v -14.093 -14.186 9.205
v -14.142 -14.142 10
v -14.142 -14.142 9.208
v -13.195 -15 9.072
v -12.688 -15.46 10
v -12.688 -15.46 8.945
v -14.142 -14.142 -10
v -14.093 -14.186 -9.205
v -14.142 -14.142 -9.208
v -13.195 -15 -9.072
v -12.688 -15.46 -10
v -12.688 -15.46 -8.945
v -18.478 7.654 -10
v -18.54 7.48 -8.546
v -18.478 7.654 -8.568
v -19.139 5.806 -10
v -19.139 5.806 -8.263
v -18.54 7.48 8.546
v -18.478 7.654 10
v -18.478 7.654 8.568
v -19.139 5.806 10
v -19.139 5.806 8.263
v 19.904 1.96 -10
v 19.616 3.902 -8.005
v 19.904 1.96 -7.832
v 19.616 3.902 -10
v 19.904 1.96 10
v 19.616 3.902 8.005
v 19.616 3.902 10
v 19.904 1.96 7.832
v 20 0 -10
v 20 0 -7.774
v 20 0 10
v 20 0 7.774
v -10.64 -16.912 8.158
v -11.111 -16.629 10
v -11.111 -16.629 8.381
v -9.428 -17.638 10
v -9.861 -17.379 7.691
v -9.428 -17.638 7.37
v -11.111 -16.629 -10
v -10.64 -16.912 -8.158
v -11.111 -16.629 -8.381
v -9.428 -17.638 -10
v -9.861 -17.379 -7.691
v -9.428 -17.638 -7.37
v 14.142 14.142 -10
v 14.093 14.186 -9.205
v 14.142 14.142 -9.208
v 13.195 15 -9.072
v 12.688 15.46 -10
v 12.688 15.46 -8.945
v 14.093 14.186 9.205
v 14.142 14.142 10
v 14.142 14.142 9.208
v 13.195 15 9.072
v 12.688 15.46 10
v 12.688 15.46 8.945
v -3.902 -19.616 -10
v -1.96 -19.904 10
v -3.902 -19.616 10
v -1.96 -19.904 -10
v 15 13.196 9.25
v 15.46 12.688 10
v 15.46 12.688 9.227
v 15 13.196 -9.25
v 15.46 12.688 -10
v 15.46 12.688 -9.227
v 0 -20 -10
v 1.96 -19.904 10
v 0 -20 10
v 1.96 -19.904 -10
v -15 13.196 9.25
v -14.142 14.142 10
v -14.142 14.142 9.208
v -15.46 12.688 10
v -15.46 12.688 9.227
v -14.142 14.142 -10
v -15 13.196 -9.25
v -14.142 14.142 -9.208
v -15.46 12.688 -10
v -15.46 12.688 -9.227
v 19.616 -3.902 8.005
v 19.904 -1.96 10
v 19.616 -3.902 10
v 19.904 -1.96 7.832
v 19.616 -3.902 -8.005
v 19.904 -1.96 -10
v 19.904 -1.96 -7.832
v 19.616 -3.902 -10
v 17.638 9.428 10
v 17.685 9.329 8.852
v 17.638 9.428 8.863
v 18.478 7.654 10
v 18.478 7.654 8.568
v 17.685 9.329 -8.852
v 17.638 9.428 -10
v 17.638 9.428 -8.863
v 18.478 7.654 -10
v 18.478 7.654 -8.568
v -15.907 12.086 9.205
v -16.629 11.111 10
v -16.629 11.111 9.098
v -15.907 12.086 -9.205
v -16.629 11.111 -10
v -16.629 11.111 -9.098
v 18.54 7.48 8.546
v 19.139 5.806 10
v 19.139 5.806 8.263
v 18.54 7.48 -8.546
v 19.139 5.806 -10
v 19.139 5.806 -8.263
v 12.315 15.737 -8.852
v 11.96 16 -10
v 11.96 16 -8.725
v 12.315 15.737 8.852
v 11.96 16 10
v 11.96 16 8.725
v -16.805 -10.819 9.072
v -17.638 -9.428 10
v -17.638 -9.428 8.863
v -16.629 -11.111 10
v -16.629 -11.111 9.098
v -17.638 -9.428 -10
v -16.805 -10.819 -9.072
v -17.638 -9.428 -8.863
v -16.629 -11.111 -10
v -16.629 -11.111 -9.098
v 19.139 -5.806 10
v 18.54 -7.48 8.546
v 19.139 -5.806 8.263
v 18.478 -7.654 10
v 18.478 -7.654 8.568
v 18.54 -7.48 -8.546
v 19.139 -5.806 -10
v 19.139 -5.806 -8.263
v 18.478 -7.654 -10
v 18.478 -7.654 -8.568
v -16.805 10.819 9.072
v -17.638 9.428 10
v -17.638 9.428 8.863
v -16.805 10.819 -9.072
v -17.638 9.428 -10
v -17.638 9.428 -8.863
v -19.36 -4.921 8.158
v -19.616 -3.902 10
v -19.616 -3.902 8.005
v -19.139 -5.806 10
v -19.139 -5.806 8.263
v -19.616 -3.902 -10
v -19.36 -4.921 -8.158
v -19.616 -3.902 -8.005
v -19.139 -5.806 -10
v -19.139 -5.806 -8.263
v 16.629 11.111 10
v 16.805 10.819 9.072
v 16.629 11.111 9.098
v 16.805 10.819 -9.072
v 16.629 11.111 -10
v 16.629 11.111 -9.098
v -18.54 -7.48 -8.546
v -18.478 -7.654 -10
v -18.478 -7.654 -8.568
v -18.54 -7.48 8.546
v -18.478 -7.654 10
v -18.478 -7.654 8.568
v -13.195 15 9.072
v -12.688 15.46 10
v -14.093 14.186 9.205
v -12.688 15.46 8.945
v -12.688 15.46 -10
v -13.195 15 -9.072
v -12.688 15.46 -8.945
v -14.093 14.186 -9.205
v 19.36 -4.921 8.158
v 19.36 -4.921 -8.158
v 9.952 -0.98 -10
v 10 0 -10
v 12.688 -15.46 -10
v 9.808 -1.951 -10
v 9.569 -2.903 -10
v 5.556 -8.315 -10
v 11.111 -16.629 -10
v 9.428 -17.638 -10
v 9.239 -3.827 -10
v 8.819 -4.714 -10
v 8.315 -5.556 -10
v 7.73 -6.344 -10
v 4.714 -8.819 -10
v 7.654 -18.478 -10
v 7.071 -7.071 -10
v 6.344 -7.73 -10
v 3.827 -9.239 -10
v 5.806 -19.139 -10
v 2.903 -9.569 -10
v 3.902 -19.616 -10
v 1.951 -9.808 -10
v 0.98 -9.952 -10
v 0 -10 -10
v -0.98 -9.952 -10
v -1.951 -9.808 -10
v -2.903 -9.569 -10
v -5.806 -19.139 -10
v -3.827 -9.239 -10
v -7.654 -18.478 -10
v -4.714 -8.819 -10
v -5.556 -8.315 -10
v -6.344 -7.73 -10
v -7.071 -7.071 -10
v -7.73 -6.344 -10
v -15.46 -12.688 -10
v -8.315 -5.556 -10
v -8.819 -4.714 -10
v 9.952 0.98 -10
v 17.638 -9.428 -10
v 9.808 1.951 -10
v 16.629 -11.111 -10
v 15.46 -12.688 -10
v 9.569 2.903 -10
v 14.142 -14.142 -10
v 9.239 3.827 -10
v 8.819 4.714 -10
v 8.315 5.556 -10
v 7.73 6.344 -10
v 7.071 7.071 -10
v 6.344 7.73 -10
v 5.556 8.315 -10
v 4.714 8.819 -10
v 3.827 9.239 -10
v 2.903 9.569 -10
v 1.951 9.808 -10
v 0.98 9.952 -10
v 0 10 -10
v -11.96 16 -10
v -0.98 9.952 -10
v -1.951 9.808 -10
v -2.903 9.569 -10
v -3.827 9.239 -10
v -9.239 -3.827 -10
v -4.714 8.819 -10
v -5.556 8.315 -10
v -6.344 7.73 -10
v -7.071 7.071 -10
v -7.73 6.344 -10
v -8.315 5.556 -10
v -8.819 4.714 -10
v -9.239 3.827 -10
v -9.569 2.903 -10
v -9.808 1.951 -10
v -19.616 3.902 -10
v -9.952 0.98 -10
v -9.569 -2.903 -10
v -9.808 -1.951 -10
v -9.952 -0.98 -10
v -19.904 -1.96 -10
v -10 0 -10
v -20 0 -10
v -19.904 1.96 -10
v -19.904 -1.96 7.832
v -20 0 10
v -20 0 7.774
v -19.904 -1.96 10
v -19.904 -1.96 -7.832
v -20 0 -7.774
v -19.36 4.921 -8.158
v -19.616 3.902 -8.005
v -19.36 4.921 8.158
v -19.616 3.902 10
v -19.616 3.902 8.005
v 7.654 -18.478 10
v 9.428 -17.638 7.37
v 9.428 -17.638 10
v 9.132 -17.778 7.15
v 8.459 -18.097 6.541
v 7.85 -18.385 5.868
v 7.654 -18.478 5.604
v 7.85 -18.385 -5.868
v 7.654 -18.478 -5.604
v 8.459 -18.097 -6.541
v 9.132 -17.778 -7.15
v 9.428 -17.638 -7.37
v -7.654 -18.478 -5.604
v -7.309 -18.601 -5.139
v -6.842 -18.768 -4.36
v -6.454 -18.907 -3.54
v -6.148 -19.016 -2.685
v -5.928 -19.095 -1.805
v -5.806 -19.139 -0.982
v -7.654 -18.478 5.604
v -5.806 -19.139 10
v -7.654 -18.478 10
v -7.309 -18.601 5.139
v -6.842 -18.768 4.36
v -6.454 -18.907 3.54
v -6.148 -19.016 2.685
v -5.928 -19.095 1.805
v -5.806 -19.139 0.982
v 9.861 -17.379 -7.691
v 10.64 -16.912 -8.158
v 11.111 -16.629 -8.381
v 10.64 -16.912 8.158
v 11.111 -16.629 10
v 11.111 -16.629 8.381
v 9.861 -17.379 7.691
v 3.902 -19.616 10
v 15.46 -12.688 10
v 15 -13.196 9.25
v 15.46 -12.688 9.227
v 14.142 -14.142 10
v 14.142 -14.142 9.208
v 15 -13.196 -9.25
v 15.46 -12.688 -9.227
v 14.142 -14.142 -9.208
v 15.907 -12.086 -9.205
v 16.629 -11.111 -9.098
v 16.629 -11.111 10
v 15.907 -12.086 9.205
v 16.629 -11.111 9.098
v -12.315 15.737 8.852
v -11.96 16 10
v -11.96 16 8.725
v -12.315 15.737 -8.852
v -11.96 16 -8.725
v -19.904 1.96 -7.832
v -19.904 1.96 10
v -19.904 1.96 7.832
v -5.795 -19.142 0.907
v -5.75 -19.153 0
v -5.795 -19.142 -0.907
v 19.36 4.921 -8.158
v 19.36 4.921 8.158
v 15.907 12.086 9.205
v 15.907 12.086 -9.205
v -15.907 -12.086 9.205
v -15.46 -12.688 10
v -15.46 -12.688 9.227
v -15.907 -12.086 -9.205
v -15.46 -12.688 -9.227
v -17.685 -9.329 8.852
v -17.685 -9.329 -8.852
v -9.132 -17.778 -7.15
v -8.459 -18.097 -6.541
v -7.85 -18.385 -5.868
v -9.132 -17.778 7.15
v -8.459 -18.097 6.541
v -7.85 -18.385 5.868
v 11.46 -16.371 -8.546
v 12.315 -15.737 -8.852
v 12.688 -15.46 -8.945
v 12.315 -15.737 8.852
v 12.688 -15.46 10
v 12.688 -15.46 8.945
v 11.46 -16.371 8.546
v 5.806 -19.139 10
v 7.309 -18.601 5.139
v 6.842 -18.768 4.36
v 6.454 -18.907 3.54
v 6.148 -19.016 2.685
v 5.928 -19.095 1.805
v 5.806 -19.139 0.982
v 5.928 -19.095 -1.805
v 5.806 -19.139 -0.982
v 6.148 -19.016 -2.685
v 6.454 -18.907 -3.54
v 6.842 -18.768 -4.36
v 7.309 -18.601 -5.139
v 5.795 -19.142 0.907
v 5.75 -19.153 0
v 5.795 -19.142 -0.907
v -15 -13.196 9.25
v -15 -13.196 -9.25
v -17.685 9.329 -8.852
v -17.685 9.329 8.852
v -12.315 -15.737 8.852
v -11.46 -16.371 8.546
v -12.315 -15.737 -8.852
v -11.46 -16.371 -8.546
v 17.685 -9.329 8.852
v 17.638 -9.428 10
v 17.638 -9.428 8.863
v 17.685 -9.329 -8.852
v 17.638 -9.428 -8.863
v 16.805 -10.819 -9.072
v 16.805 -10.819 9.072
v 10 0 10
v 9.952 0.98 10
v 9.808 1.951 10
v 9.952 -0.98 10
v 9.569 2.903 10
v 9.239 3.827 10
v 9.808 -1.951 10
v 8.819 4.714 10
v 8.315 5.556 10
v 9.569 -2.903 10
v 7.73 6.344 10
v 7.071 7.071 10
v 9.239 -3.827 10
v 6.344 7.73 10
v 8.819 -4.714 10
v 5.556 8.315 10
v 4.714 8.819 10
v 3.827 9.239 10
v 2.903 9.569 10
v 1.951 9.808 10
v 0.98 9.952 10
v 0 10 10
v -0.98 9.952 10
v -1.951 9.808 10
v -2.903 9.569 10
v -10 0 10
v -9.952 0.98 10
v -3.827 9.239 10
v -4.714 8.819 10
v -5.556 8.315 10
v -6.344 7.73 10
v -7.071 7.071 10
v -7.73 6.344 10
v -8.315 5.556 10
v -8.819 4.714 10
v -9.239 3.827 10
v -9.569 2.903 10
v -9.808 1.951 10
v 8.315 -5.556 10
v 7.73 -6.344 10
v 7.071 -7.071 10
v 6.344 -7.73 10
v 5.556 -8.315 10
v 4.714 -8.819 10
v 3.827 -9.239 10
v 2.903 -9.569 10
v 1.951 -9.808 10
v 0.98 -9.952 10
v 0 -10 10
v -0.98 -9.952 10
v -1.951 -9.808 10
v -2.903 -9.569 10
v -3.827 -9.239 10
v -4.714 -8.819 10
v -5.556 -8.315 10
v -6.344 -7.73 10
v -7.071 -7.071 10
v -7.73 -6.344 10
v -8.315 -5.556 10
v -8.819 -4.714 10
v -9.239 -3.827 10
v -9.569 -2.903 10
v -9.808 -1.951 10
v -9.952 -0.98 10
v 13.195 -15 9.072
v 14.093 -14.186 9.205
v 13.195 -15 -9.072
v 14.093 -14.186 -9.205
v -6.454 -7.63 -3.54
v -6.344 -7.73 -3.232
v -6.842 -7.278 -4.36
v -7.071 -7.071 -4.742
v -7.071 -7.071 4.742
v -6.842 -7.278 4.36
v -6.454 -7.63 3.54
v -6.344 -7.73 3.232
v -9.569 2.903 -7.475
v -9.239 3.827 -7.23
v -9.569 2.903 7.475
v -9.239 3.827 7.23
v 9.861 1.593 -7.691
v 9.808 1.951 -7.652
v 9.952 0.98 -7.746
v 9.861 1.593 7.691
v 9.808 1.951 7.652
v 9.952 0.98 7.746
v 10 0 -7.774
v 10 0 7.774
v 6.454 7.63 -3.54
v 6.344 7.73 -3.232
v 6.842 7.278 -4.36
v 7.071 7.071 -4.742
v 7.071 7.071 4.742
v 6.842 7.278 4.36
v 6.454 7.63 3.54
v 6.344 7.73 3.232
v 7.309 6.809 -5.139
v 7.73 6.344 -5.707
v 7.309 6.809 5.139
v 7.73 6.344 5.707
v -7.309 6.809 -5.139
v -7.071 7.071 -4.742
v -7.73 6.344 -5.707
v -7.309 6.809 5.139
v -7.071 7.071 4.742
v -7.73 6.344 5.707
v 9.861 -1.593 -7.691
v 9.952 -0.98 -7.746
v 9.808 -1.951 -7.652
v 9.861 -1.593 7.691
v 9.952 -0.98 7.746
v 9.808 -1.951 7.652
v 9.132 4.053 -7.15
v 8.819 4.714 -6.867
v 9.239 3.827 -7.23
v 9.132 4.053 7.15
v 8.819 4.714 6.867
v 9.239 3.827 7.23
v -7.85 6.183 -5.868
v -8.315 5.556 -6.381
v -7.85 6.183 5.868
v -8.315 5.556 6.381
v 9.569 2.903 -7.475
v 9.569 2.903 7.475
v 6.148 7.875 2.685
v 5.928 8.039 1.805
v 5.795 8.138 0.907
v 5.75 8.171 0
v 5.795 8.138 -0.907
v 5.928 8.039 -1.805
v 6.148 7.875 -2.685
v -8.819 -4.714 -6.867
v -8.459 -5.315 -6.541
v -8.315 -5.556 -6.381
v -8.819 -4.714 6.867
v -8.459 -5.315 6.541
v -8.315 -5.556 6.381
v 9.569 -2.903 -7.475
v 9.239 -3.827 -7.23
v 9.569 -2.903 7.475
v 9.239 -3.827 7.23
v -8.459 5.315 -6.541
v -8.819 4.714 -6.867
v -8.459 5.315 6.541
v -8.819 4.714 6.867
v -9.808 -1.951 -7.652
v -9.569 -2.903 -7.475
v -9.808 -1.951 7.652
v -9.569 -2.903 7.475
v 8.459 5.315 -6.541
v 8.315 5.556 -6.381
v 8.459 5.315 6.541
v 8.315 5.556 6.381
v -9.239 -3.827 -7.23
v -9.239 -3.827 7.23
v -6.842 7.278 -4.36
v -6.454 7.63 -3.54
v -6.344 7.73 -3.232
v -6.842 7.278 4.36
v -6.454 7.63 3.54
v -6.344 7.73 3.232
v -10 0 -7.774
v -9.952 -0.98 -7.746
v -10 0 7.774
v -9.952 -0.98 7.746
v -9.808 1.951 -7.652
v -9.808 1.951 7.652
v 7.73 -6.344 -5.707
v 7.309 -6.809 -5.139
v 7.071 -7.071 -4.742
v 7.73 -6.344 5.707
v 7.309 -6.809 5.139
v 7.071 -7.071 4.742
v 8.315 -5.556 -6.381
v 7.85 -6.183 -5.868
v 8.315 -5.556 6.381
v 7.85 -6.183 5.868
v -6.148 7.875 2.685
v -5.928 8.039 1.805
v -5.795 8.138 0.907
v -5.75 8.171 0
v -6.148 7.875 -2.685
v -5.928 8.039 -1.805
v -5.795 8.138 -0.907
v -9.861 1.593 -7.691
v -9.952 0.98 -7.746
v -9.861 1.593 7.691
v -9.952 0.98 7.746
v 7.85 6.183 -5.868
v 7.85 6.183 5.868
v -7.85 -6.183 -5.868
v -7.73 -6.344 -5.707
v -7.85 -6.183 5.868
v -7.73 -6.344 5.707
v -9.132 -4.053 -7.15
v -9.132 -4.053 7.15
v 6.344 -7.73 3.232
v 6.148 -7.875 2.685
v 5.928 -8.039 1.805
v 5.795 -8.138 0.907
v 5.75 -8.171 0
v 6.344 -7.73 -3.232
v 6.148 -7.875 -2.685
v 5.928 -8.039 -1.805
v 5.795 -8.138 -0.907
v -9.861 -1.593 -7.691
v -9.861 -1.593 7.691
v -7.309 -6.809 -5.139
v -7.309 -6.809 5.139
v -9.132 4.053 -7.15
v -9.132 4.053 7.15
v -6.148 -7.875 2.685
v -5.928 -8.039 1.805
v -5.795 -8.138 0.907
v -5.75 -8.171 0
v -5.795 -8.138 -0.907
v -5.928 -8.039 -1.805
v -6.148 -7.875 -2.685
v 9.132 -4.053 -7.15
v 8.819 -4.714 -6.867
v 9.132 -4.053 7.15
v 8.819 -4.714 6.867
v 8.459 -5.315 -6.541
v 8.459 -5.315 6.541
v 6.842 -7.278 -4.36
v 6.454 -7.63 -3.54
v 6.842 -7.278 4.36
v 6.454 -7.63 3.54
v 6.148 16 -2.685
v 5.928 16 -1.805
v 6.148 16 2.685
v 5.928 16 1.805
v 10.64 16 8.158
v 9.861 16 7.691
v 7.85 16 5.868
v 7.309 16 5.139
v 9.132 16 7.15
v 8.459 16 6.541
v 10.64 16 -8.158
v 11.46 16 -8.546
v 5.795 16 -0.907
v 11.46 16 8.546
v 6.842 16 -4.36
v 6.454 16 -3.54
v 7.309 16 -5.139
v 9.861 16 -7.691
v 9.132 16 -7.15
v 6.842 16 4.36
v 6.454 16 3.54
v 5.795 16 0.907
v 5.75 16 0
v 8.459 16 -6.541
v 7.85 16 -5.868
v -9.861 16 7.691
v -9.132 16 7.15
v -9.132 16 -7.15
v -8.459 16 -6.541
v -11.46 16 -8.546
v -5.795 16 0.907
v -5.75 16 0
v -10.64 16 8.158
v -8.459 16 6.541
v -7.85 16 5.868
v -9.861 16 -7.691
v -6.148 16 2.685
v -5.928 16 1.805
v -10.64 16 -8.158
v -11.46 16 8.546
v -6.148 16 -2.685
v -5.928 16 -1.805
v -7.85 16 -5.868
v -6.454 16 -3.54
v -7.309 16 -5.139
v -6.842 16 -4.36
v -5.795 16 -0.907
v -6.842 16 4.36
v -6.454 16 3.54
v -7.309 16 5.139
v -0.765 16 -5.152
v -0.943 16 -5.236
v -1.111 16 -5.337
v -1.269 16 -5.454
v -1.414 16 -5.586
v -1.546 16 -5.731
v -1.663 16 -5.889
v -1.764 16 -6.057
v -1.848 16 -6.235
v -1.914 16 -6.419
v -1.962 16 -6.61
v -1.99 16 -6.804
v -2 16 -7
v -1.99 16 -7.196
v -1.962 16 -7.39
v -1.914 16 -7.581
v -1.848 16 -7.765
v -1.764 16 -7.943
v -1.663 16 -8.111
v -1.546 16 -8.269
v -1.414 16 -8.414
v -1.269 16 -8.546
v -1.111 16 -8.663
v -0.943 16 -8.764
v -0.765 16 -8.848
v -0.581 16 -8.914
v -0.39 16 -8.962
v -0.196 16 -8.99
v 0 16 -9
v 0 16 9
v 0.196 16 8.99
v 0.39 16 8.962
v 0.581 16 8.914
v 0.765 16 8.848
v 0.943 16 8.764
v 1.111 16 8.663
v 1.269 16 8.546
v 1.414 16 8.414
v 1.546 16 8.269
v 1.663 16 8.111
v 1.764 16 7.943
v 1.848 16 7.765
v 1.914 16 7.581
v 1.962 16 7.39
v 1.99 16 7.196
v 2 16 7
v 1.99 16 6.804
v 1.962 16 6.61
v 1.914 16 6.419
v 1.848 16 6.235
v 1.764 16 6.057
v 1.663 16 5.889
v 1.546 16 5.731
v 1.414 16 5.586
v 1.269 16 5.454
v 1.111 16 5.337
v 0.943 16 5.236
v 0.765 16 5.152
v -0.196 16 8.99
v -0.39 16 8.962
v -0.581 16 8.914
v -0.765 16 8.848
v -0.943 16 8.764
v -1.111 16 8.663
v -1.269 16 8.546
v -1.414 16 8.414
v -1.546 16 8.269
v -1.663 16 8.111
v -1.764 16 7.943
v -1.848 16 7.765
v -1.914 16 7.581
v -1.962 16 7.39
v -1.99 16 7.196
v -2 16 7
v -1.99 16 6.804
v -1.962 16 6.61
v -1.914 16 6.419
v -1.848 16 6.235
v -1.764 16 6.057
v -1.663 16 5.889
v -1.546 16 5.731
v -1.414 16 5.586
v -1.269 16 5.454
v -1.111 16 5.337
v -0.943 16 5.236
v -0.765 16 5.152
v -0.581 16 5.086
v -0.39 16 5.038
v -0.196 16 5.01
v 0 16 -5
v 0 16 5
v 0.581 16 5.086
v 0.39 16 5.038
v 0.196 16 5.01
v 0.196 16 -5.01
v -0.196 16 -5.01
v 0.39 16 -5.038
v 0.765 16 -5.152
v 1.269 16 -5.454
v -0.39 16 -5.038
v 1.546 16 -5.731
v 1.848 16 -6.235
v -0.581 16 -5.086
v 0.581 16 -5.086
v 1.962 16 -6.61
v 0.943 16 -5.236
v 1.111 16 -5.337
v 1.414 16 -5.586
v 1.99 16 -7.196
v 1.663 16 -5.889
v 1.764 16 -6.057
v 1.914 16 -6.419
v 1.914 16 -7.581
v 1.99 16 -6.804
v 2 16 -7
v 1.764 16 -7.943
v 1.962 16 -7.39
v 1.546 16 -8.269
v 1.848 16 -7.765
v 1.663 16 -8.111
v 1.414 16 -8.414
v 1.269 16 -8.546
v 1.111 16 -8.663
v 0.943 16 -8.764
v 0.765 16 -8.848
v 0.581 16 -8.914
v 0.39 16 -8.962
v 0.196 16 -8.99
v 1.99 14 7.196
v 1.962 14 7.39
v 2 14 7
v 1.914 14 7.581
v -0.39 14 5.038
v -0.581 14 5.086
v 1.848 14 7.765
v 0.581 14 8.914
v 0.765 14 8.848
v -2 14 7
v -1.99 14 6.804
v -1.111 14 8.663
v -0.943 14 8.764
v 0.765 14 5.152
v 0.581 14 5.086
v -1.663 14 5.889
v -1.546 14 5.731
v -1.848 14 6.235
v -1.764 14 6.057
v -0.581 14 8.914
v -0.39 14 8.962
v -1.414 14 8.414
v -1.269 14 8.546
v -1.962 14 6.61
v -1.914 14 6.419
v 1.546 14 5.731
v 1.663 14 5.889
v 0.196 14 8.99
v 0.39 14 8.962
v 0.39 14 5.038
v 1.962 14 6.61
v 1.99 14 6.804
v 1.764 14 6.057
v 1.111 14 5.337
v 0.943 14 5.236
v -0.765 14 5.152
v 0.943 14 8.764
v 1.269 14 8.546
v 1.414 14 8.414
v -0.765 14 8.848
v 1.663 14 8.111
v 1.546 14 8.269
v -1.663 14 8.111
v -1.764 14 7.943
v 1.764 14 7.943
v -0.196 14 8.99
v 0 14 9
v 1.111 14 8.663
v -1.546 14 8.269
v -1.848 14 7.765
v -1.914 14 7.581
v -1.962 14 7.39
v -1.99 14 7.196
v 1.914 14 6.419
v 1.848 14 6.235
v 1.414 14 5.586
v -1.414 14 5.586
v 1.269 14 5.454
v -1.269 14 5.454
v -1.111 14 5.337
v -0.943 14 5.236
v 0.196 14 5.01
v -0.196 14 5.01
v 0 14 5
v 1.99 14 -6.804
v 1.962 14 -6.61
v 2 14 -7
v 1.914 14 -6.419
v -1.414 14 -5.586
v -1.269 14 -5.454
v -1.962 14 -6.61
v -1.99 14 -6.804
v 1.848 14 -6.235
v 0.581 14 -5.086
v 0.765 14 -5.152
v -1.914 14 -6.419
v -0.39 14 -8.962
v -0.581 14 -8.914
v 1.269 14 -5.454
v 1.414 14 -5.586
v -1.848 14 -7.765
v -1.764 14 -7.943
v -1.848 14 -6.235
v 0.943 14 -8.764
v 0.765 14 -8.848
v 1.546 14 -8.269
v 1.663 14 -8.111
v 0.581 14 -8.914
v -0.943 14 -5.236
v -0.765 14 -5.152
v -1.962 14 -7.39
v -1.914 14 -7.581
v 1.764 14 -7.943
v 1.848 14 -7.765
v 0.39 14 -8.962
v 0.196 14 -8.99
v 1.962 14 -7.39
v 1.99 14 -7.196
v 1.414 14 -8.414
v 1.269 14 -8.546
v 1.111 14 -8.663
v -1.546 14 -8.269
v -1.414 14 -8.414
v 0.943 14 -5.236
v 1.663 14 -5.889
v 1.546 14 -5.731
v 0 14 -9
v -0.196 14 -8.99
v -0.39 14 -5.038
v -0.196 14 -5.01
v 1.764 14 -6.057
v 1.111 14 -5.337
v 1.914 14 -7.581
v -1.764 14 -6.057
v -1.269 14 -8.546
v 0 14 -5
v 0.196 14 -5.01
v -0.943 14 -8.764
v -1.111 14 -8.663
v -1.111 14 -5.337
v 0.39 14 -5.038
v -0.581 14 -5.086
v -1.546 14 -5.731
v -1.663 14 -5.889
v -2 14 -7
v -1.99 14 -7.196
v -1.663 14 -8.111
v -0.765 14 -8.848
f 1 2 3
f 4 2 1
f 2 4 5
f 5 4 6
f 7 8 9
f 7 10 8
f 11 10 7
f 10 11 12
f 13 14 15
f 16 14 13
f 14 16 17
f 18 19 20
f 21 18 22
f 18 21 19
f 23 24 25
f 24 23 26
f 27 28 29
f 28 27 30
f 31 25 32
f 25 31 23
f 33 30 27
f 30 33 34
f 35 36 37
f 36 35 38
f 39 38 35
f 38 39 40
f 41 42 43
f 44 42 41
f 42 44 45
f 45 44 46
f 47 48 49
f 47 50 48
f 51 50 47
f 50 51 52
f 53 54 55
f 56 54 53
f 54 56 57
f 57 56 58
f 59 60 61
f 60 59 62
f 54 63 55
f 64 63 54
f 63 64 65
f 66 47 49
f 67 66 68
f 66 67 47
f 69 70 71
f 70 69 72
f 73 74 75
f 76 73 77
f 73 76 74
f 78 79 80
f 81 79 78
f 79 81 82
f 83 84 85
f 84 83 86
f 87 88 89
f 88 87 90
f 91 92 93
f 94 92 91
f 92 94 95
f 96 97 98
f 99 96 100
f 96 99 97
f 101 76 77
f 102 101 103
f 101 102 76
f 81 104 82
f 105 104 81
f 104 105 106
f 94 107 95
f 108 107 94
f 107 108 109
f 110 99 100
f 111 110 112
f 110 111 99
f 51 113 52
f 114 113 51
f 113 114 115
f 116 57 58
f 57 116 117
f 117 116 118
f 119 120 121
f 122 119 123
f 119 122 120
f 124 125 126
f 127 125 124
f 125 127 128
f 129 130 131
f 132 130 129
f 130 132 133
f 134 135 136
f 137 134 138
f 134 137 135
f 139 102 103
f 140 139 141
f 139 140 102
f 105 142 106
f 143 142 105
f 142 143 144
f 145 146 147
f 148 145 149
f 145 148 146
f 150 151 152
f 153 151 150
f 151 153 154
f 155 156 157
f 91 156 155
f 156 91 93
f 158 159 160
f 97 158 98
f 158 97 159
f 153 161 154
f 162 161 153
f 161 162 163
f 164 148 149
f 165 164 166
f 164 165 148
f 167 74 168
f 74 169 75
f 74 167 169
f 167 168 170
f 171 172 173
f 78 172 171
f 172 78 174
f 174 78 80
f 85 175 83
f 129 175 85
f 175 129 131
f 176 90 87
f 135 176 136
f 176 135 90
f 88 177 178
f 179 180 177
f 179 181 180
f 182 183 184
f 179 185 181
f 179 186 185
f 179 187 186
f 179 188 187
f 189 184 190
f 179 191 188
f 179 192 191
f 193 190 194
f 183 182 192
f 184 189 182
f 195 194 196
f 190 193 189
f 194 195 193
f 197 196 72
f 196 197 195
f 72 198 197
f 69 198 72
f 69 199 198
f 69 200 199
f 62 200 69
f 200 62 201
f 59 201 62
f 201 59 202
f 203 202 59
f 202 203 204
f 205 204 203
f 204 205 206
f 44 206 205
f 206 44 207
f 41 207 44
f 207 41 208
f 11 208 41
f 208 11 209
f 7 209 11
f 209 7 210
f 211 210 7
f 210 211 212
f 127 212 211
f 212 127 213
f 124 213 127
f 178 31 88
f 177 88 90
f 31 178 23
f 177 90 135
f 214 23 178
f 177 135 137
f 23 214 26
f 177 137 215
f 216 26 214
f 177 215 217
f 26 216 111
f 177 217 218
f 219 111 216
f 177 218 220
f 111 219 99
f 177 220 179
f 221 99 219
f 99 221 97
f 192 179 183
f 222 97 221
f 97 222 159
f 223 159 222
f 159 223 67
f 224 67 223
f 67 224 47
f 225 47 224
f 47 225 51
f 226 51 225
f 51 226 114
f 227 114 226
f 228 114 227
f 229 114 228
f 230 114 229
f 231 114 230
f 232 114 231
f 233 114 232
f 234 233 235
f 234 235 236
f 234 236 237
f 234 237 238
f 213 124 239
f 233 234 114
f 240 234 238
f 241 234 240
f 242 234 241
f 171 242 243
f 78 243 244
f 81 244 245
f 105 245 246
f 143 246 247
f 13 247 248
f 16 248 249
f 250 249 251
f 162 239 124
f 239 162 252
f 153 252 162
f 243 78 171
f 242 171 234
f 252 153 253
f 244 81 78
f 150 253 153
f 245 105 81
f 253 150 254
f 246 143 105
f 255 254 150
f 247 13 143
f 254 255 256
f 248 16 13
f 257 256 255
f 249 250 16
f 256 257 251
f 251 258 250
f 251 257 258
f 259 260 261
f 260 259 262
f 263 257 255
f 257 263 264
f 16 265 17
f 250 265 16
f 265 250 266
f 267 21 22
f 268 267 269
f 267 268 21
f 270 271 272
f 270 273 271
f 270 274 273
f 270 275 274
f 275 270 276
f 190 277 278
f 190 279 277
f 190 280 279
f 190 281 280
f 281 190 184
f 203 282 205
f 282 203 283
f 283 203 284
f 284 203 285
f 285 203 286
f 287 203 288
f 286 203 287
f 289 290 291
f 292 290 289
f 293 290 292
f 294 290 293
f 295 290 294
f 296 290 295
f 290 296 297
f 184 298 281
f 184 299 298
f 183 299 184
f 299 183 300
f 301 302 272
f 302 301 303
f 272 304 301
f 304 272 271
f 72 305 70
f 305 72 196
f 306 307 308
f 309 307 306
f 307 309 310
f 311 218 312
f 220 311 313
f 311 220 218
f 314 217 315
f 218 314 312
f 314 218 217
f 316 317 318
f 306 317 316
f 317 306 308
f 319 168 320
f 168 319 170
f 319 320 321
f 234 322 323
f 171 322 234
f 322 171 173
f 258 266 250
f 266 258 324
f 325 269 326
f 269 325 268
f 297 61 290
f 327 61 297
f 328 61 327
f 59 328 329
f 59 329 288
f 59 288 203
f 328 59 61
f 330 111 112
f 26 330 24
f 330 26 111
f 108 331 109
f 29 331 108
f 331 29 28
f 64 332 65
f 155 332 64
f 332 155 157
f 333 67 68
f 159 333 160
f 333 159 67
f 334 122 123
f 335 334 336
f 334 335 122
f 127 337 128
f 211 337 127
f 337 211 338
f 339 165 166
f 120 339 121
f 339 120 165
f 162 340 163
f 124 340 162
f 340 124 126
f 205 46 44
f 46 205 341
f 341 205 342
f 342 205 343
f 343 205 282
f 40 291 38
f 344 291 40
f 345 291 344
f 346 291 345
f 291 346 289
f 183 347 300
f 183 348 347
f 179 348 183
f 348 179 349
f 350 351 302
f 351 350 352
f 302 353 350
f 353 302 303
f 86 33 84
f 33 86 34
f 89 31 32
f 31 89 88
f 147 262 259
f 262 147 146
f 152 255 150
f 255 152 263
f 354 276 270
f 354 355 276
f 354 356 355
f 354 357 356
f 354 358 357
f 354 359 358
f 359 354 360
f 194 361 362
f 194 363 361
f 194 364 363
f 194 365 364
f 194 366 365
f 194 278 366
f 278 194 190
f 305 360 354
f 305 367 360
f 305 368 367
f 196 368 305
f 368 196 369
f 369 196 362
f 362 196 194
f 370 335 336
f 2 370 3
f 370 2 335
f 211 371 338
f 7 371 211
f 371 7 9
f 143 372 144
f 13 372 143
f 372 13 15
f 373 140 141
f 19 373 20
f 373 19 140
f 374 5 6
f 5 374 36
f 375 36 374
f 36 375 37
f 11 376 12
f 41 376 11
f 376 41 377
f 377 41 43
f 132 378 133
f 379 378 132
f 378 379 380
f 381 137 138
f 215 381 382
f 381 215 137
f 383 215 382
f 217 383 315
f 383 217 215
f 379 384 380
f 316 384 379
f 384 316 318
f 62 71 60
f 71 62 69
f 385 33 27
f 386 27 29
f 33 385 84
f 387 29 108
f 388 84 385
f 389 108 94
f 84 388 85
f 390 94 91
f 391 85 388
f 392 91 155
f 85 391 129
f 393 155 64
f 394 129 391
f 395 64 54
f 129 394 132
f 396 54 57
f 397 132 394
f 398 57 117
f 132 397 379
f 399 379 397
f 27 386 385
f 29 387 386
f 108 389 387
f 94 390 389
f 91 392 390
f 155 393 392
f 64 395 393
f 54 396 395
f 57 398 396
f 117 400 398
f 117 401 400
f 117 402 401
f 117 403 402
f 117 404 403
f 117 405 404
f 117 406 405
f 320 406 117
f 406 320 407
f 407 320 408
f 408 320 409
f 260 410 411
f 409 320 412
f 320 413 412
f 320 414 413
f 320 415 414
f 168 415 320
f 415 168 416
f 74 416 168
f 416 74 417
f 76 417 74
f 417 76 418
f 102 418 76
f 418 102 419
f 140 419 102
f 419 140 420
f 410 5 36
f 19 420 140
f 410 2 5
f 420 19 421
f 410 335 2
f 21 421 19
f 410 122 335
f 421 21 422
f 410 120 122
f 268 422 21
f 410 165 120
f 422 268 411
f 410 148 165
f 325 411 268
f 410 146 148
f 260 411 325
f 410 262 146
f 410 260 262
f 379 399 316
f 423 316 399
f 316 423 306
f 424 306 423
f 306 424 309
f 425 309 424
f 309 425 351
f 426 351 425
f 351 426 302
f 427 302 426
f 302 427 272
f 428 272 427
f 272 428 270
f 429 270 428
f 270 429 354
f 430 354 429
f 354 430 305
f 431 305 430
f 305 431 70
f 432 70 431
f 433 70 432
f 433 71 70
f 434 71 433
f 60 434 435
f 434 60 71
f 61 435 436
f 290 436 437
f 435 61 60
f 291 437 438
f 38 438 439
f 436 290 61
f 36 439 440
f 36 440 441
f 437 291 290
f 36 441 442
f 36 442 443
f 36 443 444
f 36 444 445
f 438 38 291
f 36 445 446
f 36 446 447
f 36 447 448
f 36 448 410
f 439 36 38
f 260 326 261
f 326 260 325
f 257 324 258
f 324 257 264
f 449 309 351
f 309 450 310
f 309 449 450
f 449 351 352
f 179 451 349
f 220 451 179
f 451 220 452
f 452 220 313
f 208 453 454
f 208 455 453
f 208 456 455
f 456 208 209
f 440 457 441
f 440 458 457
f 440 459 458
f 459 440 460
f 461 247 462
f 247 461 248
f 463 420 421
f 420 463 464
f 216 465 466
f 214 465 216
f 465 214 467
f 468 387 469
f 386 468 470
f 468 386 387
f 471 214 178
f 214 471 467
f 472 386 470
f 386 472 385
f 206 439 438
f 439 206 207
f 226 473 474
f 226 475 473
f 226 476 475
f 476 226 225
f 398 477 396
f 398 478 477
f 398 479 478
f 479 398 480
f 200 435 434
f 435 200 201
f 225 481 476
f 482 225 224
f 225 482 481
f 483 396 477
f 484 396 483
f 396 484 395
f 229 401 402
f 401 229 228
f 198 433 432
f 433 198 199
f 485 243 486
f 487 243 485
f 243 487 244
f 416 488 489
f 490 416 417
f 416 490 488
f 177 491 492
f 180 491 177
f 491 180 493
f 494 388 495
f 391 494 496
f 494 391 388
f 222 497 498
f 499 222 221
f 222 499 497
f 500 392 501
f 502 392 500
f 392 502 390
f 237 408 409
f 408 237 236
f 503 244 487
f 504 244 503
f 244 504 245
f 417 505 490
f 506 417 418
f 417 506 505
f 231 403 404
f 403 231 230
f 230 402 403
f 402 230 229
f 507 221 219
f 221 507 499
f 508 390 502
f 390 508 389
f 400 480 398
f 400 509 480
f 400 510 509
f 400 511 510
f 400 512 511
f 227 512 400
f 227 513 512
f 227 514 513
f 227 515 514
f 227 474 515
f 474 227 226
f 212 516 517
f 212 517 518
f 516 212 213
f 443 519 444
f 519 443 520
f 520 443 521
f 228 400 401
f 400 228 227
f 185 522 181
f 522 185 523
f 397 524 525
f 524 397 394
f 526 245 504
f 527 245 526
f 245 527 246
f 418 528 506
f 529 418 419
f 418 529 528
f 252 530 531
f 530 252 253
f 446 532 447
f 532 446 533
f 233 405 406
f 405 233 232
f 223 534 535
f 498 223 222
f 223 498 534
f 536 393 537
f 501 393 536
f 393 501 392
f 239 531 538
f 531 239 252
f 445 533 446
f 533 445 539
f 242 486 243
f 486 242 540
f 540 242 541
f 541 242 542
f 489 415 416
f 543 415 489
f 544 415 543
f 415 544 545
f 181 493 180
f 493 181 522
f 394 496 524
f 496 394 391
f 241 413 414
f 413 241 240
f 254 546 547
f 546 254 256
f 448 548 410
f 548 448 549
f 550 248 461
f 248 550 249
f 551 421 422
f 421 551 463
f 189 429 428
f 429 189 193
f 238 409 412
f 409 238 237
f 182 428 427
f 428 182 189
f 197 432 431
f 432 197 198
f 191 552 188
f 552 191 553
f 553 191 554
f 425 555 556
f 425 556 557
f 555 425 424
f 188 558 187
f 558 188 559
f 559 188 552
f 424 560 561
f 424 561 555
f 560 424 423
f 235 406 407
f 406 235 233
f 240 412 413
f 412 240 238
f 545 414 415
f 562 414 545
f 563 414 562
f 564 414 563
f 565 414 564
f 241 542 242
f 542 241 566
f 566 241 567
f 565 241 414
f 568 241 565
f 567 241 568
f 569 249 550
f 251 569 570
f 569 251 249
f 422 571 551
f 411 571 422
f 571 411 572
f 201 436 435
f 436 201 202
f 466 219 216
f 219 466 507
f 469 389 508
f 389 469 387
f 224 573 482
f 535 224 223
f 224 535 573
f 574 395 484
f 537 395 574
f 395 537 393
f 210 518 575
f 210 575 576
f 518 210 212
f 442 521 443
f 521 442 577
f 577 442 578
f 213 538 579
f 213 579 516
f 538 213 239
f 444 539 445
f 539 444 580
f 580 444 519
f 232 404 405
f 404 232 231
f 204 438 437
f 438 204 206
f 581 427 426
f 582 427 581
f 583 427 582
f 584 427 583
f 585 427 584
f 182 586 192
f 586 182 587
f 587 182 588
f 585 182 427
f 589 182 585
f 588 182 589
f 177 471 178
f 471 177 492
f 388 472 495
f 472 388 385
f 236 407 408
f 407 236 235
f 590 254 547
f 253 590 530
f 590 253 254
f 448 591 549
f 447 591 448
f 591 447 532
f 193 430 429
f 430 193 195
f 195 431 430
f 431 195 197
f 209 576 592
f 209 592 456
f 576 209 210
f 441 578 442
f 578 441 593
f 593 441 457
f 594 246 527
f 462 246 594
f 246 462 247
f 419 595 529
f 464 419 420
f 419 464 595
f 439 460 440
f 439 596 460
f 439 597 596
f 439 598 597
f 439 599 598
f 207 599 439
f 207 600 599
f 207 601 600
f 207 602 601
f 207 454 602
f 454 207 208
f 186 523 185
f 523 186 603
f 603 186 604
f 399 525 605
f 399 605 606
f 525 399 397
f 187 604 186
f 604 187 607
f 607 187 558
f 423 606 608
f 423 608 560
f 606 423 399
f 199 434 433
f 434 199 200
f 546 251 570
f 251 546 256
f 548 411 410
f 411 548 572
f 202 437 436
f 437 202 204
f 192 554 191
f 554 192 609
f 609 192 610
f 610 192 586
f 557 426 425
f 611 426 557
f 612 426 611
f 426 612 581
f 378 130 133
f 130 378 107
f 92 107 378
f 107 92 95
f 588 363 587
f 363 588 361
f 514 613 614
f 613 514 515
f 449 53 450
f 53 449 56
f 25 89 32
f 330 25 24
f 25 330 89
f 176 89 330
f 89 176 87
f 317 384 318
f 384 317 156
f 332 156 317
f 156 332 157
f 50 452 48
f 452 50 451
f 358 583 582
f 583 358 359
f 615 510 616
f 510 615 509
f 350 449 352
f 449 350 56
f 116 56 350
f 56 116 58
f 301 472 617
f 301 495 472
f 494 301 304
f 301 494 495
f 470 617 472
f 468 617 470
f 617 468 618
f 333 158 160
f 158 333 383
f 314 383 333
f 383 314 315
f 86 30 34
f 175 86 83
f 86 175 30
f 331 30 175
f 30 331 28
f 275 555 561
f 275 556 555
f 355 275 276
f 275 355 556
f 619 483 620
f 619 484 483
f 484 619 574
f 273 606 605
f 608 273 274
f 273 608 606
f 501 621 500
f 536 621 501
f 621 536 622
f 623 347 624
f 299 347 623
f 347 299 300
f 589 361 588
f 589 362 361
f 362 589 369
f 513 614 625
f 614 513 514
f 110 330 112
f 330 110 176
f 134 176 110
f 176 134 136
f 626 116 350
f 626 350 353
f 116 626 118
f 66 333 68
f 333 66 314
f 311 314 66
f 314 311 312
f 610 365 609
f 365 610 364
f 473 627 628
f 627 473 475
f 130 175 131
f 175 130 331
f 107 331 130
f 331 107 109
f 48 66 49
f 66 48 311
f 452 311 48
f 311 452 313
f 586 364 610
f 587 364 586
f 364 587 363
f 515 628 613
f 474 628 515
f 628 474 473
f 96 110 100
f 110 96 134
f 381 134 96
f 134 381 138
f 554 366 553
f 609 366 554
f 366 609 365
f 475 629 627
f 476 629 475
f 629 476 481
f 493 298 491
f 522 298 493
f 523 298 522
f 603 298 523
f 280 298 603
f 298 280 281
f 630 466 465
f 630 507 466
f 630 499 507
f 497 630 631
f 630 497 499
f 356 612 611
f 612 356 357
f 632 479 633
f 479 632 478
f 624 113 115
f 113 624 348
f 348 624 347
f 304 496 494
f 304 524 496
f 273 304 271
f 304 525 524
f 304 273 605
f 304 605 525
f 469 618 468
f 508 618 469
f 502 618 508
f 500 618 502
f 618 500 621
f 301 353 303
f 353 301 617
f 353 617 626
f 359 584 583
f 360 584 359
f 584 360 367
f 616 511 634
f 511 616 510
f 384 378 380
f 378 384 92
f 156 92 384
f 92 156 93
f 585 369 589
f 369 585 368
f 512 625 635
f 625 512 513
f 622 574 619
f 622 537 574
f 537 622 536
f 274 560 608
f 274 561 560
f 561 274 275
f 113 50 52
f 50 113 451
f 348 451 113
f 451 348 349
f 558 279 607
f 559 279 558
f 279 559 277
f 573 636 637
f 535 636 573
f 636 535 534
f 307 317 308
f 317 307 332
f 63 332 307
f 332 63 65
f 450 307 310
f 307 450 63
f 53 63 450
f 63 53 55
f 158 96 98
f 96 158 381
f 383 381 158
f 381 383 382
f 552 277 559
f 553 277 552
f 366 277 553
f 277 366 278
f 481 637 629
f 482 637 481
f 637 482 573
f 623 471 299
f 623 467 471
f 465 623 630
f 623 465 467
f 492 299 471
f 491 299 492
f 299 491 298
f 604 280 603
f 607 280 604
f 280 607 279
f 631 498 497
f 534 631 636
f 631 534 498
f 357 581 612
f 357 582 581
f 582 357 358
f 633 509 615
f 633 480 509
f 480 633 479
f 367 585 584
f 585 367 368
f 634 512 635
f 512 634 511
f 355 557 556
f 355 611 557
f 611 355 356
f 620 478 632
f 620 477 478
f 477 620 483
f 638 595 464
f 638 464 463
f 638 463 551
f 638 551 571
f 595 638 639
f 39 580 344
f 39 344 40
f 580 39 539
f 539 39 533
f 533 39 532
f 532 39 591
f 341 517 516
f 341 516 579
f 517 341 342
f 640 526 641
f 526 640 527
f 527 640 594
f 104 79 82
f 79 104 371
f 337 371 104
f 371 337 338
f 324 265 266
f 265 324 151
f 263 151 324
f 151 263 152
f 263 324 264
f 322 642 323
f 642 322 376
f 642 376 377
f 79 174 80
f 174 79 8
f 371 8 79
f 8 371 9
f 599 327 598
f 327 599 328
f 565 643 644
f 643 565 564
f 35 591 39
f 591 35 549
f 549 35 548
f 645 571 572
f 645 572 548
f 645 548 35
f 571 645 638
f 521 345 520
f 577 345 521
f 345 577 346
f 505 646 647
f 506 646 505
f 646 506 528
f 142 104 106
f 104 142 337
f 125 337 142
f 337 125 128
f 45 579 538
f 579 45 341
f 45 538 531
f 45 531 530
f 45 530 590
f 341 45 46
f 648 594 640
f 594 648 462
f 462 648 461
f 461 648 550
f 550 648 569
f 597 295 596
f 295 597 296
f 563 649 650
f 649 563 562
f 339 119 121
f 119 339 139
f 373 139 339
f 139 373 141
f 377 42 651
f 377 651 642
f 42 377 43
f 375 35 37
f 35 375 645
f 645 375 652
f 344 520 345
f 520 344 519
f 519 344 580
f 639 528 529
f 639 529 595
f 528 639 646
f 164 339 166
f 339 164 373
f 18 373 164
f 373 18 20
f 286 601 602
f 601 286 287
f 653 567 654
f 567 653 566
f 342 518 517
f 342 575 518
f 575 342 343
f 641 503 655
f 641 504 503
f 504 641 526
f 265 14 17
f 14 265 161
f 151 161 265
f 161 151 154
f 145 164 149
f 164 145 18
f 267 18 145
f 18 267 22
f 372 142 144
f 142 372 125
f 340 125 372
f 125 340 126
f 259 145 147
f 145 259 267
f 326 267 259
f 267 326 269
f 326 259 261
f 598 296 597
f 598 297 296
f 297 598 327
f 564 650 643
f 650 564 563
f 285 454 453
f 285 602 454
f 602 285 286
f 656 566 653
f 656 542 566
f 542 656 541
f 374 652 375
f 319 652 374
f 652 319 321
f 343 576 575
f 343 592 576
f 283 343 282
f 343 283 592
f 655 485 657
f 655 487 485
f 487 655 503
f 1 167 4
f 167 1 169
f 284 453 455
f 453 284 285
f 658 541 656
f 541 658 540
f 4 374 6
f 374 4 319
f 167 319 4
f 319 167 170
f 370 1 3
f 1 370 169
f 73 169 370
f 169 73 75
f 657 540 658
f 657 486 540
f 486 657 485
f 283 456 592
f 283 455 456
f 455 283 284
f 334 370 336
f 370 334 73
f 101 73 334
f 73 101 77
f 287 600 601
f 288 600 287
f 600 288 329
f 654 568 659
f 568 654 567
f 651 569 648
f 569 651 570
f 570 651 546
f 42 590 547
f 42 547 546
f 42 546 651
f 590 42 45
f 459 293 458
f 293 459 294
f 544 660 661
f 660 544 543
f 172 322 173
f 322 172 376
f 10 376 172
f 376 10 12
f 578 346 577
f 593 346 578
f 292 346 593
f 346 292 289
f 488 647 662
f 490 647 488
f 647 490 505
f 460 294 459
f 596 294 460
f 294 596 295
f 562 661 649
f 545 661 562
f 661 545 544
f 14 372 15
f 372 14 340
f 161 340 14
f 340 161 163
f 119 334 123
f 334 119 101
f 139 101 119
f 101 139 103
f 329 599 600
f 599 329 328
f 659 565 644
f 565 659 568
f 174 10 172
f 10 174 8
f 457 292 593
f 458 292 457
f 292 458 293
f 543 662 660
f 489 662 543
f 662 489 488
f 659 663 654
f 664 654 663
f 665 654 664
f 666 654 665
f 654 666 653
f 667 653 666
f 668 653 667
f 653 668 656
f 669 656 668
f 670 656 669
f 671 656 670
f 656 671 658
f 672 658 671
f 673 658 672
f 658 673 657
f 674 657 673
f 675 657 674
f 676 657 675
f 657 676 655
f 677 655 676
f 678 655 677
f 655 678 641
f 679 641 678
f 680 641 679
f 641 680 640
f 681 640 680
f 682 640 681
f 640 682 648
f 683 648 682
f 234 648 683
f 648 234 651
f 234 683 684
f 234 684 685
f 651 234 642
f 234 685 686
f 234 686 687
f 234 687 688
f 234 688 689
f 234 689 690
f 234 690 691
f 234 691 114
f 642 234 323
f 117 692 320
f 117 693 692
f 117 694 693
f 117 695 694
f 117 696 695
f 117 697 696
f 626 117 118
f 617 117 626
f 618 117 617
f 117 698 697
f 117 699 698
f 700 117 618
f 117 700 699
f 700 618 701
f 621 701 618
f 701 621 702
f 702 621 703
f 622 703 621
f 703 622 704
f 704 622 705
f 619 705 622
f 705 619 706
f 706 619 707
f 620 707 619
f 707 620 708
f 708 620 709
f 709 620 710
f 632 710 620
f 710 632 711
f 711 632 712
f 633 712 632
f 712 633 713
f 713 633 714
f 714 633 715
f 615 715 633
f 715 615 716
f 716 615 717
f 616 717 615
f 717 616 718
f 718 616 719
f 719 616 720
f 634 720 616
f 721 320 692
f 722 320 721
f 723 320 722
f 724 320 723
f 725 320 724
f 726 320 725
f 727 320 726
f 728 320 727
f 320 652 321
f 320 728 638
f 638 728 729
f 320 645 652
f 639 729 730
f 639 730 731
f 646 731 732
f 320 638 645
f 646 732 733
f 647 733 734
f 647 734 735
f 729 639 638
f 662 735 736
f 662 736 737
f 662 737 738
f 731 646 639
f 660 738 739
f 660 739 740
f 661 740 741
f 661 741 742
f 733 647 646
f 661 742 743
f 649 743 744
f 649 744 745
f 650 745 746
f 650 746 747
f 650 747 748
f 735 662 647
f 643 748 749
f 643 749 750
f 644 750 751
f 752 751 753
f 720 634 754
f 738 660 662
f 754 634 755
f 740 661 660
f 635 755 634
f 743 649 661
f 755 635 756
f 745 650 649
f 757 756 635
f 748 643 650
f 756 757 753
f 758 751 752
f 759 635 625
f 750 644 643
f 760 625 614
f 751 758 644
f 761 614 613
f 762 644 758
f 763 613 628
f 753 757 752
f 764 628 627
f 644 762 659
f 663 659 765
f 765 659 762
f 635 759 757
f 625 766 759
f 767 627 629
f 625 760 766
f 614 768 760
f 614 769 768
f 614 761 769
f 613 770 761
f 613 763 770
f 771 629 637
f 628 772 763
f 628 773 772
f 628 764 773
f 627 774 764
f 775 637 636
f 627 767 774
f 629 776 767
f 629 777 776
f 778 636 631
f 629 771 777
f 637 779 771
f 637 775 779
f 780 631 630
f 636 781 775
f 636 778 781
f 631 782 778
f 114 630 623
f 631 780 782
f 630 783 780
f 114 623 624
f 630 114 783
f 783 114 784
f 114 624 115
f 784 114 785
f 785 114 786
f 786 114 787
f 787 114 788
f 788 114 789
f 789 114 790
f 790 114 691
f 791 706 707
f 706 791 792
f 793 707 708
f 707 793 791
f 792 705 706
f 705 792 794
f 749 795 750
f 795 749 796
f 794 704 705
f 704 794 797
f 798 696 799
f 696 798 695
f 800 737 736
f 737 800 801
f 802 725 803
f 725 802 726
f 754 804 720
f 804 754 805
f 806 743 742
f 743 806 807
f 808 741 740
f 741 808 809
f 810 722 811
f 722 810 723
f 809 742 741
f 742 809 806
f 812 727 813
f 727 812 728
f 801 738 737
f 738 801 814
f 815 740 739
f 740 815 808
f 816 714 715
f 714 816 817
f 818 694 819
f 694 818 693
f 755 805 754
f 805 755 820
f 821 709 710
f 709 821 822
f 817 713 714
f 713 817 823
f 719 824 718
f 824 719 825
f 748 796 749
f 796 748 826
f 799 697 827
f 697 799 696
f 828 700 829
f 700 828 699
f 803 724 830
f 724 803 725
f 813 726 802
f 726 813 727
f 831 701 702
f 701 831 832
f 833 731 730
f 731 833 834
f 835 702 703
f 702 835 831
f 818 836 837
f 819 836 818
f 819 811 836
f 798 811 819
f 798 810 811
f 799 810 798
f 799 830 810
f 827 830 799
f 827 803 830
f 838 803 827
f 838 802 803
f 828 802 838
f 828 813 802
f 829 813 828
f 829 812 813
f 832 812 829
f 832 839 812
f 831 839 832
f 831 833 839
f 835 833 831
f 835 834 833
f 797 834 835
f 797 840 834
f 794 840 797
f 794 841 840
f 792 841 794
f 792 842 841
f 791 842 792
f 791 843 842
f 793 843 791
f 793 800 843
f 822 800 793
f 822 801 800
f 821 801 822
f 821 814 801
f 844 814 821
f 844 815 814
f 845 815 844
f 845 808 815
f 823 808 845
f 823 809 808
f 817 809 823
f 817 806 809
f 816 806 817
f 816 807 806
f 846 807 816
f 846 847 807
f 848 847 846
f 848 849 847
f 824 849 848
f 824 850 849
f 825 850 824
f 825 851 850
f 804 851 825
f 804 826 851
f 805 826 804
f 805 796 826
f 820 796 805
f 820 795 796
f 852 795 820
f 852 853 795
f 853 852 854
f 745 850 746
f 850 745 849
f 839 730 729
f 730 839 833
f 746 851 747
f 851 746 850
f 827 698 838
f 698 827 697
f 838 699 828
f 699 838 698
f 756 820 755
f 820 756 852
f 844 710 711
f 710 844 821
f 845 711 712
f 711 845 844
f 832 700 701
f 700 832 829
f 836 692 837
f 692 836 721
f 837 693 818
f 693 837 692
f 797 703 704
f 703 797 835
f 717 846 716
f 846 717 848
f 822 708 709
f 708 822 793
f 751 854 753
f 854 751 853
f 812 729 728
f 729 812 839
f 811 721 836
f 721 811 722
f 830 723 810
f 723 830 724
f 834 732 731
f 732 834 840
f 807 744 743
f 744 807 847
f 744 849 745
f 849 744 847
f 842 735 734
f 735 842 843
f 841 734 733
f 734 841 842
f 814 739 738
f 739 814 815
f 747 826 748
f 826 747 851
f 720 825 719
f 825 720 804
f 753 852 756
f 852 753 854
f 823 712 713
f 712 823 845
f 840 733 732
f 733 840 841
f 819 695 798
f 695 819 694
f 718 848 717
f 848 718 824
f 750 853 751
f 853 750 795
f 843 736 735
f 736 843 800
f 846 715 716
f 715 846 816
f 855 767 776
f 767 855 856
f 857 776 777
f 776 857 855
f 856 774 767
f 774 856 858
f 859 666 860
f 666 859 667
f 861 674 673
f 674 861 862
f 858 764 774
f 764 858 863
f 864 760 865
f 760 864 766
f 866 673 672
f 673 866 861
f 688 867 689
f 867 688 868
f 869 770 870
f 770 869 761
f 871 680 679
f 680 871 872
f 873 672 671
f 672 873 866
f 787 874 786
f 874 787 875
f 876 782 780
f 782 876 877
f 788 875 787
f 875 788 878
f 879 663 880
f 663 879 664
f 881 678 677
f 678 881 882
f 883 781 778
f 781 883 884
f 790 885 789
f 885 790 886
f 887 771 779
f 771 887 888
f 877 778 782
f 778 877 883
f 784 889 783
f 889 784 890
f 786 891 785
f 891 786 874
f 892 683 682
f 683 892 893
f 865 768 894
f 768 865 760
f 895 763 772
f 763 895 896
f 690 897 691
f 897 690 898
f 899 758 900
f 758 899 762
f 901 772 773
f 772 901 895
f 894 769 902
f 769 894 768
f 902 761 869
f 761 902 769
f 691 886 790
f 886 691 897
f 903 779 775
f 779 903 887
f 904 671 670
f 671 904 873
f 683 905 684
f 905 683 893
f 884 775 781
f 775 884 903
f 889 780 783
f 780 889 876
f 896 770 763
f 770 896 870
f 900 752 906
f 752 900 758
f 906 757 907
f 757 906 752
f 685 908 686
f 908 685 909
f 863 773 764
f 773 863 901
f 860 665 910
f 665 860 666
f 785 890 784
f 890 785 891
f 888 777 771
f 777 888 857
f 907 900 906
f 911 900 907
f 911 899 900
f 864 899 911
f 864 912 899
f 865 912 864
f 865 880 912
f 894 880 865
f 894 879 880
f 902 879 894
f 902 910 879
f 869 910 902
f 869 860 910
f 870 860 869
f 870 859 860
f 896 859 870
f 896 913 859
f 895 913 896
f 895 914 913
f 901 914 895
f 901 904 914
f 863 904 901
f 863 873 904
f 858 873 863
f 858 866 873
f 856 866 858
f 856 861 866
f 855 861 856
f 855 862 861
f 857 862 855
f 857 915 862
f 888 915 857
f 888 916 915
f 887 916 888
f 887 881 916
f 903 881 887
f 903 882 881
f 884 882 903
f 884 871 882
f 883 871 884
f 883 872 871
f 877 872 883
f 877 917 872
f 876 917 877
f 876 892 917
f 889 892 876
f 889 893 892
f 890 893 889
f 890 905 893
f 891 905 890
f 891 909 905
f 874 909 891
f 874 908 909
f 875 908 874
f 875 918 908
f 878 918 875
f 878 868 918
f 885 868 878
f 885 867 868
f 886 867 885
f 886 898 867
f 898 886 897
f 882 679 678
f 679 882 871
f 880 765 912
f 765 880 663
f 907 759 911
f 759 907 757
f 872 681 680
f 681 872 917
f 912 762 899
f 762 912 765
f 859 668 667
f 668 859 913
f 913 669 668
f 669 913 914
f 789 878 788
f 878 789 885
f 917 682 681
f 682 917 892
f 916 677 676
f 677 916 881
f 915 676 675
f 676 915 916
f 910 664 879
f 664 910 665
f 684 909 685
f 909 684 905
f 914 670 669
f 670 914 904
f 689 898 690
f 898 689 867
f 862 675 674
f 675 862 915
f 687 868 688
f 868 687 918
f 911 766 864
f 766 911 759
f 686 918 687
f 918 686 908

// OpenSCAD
// COBRA Vertebra - T9 V15
// Height: 20.0mm, OD: 40.0mm

$fn = 64;

difference() {
    // Outer cylinder
    cylinder(h=20.0, d=40.0, center=true);
    
    // Inner channel
    cylinder(h=22.0, d=20.0, center=true);

    // Battery cavity 1
    rotate([0, 0, 0])
    translate([15.0, 0, 0])
    rotate([90, 0, 0])
    cylinder(h=74.0, d=18.5, center=true);

    // Battery cavity 2
    rotate([0, 0, 180])
    translate([15.0, 0, 0])
    rotate([90, 0, 0])
    cylinder(h=74.0, d=18.5, center=true);

    // Solar panel cavity
    translate([0, 18.0, 0])
    cube([50, 4, 30], center=true);

    // Pivot holes
    translate([0, 20.0, 7.0])
    rotate([90, 0, 0])
    cylinder(h=12.0, d=4, center=true);
    
    translate([0, 20.0, -7.0])
    rotate([90, 0, 0])
    cylinder(h=12.0, d=4, center=true);
}
